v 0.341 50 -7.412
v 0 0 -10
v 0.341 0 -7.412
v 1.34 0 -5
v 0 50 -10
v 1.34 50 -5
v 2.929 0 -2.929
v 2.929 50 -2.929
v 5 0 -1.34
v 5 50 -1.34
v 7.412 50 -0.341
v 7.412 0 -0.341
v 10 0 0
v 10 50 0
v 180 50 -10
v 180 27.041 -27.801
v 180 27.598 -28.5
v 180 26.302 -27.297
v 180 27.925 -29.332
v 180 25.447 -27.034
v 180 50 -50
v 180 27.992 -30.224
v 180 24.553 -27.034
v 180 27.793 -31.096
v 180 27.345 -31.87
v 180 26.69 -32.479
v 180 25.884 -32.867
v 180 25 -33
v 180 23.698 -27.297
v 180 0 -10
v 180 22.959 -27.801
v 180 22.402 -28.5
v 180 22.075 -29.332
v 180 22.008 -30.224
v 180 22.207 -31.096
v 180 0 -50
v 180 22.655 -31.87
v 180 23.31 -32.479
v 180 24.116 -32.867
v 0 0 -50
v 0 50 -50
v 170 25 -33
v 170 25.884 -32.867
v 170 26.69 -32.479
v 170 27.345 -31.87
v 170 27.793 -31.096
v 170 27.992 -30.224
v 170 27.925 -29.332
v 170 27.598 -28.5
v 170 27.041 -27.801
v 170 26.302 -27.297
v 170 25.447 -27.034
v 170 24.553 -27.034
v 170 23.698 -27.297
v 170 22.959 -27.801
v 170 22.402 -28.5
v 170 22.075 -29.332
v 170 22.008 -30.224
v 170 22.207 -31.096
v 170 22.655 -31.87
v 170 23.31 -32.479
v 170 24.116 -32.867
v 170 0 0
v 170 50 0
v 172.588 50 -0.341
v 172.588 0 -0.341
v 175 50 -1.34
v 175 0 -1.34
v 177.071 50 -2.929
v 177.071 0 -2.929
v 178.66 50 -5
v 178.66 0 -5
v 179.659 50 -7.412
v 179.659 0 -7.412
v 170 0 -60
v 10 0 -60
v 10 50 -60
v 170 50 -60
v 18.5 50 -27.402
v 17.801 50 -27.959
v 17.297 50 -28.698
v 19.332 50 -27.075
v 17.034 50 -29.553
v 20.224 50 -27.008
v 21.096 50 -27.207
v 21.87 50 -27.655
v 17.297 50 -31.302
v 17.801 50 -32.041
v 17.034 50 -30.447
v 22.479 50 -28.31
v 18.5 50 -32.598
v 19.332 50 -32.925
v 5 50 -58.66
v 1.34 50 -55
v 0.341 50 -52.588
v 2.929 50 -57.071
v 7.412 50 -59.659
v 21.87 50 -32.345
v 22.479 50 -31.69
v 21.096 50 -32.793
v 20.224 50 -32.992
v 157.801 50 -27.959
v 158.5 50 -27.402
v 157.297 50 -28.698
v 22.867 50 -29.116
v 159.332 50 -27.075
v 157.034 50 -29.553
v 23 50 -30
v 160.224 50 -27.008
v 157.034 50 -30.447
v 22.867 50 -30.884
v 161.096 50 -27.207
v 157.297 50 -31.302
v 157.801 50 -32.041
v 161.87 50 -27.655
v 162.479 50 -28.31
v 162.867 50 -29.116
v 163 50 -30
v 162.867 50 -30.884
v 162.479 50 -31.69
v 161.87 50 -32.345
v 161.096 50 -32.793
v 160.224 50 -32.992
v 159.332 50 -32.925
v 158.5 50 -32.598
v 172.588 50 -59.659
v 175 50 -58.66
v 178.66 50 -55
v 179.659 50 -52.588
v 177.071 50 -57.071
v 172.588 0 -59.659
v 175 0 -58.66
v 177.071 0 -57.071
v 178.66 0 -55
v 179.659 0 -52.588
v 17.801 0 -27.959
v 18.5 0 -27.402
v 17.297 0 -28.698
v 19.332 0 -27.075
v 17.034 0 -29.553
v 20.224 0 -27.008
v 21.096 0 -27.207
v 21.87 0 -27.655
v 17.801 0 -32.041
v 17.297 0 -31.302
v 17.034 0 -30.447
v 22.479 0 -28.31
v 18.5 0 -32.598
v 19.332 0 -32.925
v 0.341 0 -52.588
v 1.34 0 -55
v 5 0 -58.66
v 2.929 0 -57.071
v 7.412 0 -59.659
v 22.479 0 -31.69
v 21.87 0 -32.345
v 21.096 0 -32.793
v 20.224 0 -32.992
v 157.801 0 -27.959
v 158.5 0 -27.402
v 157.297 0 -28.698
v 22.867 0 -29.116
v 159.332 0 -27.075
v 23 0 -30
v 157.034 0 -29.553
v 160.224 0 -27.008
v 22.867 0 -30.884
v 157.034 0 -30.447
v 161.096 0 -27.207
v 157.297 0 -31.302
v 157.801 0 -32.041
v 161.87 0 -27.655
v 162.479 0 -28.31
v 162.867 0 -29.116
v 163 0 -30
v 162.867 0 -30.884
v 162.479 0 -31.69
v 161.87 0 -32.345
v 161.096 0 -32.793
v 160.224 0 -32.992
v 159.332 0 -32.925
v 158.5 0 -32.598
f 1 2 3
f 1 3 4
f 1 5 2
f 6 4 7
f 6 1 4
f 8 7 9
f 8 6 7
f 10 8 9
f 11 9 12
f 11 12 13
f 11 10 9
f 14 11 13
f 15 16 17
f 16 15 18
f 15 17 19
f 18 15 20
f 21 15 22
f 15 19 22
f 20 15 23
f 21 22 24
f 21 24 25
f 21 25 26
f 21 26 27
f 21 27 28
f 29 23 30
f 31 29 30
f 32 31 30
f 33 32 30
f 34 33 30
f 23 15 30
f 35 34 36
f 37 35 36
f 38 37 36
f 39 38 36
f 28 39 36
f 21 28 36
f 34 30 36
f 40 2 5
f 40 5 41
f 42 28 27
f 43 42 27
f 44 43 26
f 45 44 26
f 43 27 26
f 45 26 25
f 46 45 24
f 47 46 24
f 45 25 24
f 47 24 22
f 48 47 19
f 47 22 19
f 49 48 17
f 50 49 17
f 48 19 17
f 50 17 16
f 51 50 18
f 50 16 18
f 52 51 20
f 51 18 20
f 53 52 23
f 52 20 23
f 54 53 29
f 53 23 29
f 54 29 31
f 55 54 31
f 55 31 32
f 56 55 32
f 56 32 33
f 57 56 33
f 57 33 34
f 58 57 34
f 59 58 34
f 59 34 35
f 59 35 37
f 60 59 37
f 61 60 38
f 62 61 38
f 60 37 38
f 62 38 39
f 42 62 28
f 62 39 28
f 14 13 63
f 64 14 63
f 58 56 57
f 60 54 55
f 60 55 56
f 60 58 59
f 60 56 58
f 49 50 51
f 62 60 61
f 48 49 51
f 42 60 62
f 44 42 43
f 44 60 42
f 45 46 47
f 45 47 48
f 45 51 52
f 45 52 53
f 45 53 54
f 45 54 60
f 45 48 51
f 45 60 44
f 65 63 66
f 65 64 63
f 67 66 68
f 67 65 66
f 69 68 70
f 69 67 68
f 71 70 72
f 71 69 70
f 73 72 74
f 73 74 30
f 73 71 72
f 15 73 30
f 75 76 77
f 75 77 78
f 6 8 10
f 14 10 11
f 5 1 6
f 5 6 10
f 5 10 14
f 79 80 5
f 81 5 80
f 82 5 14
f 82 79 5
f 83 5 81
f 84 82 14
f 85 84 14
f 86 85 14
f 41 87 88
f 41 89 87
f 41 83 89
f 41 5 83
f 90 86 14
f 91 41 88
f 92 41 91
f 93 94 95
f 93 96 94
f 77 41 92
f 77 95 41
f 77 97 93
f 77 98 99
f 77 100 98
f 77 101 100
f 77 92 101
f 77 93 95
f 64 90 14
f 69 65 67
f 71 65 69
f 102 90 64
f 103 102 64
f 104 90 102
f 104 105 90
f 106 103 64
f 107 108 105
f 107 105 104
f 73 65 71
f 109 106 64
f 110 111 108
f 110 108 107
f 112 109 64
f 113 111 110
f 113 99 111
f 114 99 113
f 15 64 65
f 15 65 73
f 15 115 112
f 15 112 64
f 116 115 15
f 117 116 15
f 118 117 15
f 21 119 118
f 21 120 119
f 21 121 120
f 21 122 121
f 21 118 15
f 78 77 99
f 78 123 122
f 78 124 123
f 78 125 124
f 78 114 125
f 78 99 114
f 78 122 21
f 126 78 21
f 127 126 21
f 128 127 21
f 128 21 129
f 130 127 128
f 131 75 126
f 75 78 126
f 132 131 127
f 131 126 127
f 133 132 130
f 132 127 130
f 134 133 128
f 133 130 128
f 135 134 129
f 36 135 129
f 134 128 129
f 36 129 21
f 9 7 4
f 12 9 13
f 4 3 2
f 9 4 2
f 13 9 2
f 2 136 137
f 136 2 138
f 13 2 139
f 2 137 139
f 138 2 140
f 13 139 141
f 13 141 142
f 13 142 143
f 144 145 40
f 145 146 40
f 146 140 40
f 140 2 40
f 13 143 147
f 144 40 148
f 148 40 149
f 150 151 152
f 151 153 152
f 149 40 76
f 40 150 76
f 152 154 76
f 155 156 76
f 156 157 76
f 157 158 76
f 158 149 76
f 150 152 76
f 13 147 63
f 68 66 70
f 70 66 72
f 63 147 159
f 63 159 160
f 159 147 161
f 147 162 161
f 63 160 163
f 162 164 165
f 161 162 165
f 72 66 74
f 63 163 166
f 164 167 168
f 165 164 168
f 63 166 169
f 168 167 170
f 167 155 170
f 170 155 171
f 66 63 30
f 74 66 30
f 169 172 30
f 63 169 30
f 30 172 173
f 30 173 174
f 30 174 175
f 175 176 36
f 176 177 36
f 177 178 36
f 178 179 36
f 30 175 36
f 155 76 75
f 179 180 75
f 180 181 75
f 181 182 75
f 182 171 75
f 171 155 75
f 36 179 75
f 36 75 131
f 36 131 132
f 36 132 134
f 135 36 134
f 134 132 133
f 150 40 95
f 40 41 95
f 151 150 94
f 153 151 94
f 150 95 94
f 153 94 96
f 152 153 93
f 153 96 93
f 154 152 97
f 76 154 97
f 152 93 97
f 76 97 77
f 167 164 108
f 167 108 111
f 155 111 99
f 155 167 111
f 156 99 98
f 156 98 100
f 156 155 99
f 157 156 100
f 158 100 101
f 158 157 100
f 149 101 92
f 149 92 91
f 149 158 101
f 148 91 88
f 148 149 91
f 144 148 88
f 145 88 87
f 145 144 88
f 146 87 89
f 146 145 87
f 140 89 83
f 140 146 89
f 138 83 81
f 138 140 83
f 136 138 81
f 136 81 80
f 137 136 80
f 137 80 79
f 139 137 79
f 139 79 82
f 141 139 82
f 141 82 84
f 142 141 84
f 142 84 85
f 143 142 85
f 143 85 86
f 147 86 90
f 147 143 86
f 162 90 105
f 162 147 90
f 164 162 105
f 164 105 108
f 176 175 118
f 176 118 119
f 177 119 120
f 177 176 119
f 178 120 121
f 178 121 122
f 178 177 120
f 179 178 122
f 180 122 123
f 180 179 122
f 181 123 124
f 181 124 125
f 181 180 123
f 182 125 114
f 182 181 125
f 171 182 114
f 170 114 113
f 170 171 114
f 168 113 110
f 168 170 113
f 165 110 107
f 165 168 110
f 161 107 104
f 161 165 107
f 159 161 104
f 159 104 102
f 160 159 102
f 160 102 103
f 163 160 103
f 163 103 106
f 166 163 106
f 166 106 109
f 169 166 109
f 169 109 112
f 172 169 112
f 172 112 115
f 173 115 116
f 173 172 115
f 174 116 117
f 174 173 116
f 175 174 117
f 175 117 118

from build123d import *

# Parameters (mm, degrees)
SKETCH1_W           = 180
SKETCH1_H           = 60
SKETCH1_R           = 3
BOSS_EXTRUDE1_DEPTH = 50
SKETCH2_R           = 3
CUT_EXTRUDE1_DEPTH  = 10
FILLET1_R           = 10


with BuildPart() as part:
    # Sketch1 → Boss-Extrude1 (new body)
    with BuildSketch(Plane(origin=(0, 0, 0), x_dir=(1, 0, 0), z_dir=(0, 1, 0))):
        with Locations((90, 30)):
            Rectangle(SKETCH1_W, SKETCH1_H)
        with Locations((20, 30)):
            Circle(SKETCH1_R, mode=Mode.SUBTRACT)
        with Locations((160, 30)):
            Circle(SKETCH1_R, mode=Mode.SUBTRACT)
    extrude(amount=BOSS_EXTRUDE1_DEPTH)

    # Sketch2 → Cut-Extrude1 (cut)
    with BuildSketch(Plane(origin=(180, 0, 0), x_dir=(0, 0, -1), z_dir=(1, 0, 0))):
        with Locations((30, 25)):
            Circle(SKETCH2_R)
    extrude(amount=-CUT_EXTRUDE1_DEPTH, mode=Mode.SUBTRACT)

    # Fillet1
    fillet1_edges = [part.edges().sort_by_distance(p)[0] for p in [
        (0, 25, -60),
        (180, 25, -60),
        (180, 25, 0),
        (0, 25, 0),
    ]]
    fillet(fillet1_edges, radius=FILLET1_R)


solid = part.part
